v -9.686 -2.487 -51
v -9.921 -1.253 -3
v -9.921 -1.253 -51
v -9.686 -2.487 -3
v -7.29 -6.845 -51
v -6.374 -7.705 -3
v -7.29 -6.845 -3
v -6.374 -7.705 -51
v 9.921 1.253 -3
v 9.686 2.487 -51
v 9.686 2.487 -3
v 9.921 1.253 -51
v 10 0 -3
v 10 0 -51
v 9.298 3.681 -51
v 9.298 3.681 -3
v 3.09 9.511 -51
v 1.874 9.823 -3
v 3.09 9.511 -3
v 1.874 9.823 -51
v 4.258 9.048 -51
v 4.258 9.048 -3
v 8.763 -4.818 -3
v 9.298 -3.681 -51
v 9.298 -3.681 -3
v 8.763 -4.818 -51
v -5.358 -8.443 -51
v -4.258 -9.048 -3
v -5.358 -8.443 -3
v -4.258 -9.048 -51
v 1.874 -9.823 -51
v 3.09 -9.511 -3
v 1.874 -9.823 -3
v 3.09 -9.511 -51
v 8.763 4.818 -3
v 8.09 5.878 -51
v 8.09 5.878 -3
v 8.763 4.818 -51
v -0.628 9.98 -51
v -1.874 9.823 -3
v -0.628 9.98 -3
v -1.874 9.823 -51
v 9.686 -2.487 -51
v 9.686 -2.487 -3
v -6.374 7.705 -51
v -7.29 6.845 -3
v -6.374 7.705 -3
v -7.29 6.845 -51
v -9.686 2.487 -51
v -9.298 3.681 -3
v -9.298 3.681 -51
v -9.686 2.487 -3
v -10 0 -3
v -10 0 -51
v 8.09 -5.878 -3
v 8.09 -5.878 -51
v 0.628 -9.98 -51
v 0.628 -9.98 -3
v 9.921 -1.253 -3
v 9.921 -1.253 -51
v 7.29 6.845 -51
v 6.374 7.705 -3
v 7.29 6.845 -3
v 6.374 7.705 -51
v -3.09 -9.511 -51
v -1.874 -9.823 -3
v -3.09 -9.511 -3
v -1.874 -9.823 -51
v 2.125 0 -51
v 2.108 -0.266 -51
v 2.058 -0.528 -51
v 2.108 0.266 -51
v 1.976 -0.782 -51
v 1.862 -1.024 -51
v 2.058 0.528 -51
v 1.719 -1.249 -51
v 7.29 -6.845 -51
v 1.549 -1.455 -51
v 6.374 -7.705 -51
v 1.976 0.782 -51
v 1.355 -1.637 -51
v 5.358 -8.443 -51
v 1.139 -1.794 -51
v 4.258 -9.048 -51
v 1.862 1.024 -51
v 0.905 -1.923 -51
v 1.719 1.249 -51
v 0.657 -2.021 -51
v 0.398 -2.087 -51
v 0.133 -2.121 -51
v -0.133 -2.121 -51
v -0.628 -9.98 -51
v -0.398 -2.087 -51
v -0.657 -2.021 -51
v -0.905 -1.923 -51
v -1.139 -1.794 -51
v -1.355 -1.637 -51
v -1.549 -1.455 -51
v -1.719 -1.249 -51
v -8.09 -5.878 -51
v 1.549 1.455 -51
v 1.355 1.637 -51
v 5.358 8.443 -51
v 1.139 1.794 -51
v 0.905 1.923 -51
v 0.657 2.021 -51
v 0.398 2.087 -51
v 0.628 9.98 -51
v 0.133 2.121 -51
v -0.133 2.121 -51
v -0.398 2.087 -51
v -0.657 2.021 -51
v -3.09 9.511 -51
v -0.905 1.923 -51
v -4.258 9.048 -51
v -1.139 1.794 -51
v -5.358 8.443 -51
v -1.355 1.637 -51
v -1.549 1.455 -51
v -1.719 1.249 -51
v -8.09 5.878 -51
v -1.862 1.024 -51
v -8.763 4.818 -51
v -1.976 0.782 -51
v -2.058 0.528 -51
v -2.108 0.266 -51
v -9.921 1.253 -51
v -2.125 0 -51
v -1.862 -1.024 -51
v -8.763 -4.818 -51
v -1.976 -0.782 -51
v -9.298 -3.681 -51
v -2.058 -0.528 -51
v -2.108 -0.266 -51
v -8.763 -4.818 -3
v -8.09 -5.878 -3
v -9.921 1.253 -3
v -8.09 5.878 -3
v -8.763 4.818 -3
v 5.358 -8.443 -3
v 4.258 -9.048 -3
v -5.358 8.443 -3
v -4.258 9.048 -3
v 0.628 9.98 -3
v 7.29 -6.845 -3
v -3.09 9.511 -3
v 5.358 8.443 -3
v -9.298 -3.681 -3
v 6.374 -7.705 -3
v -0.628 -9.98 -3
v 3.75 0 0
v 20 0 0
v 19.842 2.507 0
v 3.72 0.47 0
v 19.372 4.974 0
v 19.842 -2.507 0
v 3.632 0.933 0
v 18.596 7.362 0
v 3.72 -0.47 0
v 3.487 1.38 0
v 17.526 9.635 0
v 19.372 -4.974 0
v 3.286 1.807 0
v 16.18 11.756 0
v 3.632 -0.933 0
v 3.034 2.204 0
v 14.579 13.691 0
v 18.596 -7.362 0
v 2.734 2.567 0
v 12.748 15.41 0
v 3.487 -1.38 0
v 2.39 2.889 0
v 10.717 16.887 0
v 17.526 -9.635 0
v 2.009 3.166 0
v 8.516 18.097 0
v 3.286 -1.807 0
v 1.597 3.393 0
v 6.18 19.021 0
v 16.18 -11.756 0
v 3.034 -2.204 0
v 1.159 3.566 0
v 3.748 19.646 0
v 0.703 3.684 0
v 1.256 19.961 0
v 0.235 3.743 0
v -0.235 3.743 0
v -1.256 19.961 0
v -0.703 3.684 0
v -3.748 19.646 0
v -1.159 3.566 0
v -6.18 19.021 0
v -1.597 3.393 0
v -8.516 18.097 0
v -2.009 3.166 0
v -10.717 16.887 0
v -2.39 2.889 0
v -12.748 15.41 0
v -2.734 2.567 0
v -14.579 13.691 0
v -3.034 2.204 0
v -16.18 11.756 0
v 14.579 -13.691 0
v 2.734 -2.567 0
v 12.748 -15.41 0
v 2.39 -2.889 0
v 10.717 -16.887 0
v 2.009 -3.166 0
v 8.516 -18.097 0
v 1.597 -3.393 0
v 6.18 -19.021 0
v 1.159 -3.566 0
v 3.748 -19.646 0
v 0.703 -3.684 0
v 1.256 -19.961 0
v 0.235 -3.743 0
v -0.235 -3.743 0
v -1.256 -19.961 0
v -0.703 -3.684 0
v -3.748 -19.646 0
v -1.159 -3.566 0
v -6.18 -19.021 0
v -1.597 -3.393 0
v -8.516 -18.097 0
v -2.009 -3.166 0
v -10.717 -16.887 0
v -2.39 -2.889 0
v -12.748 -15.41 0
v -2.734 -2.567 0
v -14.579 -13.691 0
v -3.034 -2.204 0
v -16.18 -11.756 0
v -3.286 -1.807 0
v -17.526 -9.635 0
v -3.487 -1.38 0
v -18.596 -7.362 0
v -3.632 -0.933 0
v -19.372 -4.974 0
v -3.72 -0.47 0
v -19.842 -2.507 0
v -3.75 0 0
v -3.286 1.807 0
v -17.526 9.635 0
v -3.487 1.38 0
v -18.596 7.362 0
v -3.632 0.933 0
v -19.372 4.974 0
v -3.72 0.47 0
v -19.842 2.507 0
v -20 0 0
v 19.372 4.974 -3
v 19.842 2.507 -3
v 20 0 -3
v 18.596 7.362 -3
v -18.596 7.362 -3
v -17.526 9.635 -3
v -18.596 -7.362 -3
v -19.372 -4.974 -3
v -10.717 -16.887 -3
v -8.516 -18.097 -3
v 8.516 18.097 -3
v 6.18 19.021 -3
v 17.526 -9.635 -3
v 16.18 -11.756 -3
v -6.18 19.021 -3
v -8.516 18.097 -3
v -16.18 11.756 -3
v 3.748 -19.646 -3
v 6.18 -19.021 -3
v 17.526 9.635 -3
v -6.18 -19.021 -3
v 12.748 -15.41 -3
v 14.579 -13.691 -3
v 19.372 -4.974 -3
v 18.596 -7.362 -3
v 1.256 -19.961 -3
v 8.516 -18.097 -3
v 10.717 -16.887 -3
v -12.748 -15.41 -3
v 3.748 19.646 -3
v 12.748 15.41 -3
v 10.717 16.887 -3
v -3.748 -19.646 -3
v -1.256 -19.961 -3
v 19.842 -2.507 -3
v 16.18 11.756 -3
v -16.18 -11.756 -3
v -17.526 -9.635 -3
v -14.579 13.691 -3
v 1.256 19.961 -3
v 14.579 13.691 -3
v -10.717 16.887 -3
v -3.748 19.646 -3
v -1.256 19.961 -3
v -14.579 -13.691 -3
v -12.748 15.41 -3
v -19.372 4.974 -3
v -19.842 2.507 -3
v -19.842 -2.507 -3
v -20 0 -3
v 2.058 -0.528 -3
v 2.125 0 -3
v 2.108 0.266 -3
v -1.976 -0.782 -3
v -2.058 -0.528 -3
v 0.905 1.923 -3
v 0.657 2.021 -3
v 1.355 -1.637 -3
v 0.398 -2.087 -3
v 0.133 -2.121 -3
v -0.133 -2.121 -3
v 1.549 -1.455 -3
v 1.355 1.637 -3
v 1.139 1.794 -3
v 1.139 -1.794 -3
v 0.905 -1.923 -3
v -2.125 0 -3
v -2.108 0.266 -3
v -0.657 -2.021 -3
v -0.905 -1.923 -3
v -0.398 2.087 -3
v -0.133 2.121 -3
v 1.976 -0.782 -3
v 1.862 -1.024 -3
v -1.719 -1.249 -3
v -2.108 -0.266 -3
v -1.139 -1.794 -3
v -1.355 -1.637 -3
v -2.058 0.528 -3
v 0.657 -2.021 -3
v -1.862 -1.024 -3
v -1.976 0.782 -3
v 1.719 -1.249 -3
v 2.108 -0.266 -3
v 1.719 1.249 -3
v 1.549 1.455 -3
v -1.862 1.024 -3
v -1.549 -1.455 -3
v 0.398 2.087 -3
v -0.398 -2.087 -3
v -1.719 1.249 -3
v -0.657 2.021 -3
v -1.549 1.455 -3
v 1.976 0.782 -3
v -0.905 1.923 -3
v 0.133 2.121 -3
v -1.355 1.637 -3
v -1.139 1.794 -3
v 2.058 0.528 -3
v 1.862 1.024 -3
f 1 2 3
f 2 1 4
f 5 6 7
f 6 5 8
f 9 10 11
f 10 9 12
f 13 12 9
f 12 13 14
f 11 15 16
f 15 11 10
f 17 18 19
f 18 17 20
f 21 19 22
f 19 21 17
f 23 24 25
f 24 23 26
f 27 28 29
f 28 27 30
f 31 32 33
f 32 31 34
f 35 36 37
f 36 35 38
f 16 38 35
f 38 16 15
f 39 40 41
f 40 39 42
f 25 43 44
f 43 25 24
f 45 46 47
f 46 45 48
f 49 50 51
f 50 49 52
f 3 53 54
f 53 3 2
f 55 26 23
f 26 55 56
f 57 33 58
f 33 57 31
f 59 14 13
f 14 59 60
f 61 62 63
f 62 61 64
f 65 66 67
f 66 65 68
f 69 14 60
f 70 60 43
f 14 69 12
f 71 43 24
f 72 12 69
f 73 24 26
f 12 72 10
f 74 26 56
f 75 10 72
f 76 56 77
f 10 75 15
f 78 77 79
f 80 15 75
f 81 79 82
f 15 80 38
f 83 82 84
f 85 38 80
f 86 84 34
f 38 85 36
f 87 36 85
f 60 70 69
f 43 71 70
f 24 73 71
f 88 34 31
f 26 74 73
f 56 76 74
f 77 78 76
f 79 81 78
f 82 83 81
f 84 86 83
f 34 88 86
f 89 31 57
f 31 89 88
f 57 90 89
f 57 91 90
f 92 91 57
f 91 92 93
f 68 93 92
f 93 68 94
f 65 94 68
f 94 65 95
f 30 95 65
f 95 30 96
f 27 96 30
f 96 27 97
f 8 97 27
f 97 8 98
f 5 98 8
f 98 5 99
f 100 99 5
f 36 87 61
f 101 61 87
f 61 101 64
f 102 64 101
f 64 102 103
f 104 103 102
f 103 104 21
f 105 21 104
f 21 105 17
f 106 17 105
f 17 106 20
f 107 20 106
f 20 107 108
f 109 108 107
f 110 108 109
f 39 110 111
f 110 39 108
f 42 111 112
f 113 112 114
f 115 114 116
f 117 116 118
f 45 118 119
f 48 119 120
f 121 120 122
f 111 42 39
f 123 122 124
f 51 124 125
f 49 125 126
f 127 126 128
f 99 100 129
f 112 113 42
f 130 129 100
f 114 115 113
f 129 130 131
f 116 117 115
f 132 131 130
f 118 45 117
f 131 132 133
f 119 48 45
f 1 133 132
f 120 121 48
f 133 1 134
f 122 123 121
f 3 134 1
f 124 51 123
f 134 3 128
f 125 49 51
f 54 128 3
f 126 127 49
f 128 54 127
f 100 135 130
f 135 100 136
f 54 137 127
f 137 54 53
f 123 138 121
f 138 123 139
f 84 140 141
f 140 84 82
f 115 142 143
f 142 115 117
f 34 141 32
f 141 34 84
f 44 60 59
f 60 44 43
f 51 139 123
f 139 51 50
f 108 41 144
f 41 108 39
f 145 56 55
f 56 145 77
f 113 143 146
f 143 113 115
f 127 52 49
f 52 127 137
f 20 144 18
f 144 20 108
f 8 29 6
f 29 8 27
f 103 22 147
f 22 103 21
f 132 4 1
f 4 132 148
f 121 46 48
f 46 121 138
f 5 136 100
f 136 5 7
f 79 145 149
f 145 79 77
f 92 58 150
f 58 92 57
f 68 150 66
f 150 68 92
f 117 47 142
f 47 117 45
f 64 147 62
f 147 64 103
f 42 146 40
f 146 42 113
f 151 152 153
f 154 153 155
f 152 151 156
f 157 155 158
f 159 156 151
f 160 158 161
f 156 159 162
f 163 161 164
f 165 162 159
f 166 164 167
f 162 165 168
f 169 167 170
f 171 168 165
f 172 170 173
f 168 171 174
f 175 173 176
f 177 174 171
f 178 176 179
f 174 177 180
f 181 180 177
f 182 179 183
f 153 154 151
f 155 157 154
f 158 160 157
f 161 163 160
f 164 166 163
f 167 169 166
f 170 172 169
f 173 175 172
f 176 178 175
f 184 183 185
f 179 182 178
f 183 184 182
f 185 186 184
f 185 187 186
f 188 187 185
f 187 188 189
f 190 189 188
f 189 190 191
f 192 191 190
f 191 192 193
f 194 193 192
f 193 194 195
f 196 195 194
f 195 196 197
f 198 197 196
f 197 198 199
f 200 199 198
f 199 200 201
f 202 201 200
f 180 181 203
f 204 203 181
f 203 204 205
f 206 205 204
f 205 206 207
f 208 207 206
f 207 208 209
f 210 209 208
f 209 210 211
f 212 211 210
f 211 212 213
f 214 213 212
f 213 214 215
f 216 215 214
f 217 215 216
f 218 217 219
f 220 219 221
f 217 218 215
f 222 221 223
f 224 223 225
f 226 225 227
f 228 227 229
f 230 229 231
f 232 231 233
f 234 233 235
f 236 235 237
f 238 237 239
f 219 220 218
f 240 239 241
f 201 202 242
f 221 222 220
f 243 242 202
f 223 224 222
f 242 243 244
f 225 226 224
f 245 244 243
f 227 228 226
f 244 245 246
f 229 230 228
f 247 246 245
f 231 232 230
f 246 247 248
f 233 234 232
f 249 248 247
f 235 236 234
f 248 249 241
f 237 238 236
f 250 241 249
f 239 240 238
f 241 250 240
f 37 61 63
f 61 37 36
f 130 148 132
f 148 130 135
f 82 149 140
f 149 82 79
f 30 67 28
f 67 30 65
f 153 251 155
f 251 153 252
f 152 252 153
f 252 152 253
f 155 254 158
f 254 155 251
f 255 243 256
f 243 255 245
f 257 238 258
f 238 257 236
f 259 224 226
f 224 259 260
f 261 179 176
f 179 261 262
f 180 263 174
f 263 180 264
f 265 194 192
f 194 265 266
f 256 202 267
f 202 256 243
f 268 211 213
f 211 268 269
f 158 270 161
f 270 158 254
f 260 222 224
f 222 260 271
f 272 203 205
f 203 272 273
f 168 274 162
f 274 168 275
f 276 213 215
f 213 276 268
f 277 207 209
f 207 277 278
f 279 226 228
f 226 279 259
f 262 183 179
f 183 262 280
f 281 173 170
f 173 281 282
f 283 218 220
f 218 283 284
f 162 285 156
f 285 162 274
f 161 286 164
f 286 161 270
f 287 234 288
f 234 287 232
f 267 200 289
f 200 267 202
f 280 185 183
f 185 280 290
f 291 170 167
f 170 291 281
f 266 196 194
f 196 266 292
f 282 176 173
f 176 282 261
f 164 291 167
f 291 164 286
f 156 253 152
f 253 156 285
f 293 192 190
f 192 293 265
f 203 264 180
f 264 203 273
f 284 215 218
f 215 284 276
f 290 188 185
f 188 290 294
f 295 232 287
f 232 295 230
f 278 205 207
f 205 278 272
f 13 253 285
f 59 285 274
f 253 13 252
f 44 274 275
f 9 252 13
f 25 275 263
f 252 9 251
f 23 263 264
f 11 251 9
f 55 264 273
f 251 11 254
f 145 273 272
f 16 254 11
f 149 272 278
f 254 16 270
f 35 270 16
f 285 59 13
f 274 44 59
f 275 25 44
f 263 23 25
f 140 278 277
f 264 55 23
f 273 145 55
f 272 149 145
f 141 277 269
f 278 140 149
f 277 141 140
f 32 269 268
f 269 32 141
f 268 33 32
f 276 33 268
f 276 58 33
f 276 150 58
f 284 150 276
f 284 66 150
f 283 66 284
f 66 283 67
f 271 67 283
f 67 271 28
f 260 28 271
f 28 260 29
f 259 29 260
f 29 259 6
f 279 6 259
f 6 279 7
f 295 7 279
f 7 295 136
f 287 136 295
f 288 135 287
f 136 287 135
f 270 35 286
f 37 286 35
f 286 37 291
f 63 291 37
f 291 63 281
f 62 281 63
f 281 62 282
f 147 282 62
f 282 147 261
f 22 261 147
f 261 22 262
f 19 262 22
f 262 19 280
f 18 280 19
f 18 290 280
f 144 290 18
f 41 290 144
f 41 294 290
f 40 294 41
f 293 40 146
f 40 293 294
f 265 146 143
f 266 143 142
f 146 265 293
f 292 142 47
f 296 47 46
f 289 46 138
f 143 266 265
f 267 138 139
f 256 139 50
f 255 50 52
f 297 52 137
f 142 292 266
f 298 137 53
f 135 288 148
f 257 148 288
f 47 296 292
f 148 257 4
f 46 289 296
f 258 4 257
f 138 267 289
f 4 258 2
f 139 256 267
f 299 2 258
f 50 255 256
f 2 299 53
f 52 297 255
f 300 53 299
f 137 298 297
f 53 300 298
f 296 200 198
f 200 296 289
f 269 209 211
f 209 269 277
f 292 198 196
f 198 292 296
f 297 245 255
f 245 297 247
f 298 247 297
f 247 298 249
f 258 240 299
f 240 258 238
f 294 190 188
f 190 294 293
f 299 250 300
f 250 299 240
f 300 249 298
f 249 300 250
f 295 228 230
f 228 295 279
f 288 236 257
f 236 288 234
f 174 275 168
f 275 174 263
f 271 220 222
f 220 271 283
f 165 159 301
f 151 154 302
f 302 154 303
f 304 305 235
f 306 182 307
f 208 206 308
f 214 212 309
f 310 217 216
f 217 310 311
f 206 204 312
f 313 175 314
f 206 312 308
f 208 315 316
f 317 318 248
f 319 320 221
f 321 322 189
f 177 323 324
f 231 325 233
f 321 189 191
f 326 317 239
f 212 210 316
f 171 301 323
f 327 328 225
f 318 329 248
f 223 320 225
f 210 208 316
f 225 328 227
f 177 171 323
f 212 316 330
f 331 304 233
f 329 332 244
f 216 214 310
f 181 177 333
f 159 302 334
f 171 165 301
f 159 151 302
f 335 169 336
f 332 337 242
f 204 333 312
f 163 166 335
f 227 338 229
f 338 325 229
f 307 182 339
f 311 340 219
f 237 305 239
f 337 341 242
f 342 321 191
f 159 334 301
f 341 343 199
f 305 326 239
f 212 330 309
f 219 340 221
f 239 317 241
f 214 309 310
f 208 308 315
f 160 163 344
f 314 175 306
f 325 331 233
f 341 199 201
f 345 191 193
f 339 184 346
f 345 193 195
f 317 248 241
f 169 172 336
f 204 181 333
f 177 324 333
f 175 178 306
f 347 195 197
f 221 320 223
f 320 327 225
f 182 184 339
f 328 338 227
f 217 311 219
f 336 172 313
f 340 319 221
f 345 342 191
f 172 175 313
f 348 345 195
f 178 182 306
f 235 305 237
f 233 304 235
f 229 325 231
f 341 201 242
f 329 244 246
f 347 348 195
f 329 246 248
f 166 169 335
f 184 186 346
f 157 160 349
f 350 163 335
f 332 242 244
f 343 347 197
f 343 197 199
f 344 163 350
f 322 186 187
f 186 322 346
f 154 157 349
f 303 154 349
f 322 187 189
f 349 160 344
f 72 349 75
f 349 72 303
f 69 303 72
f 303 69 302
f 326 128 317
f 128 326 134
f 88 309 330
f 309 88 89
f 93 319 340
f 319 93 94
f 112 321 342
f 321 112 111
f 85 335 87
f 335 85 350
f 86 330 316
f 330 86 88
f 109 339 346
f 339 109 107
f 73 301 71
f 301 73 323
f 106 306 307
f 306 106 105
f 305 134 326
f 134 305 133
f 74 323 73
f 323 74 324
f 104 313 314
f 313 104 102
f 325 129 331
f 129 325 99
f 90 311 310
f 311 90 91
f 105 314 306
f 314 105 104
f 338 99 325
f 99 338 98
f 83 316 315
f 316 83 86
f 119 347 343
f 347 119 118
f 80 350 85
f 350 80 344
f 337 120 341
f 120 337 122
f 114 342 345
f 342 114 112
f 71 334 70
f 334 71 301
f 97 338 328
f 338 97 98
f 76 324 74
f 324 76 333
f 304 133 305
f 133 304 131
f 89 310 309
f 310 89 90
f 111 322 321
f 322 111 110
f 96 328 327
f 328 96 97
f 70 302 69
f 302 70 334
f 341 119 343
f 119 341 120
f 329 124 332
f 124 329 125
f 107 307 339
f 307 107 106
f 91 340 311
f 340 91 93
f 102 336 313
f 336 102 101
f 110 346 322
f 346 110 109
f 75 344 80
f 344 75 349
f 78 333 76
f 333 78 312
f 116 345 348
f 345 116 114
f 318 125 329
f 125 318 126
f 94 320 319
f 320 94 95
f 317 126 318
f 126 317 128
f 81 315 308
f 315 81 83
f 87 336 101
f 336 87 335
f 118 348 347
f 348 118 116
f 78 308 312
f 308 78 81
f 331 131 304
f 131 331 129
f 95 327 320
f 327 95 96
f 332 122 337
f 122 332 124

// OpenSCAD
$fn = 50;


difference() {
	union() {
		translate(v = [0, 0, -51.0000000000]) {
			cylinder(h = 51, r = 10.0000000000);
		}
		translate(v = [0, 0, -3.0000000000]) {
			cylinder(h = 3, r = 20.0000000000);
		}
	}
	union() {
		translate(v = [0, 0, 0]) {
			rotate(a = [0, 0, 0]) {
				difference() {
					union() {
						#translate(v = [0, 0, -51.0000000000]) {
							cylinder(h = 51, r = 2.0000000000);
						}
						#translate(v = [0, 0, -3]) {
							cylinder(h = 3, r = 10.0000000000, r1 = 2.1250000000, r2 = 3.7500000000);
						}
						#translate(v = [0, 0, -51.0000000000]) {
							cylinder(h = 51, r = 2.1250000000);
						}
						#translate(v = [0, 0, -51.0000000000]) {
							cylinder(h = 51, r = 2.0000000000);
						}
					}
					union();
				}
			}
		}
	}
}
